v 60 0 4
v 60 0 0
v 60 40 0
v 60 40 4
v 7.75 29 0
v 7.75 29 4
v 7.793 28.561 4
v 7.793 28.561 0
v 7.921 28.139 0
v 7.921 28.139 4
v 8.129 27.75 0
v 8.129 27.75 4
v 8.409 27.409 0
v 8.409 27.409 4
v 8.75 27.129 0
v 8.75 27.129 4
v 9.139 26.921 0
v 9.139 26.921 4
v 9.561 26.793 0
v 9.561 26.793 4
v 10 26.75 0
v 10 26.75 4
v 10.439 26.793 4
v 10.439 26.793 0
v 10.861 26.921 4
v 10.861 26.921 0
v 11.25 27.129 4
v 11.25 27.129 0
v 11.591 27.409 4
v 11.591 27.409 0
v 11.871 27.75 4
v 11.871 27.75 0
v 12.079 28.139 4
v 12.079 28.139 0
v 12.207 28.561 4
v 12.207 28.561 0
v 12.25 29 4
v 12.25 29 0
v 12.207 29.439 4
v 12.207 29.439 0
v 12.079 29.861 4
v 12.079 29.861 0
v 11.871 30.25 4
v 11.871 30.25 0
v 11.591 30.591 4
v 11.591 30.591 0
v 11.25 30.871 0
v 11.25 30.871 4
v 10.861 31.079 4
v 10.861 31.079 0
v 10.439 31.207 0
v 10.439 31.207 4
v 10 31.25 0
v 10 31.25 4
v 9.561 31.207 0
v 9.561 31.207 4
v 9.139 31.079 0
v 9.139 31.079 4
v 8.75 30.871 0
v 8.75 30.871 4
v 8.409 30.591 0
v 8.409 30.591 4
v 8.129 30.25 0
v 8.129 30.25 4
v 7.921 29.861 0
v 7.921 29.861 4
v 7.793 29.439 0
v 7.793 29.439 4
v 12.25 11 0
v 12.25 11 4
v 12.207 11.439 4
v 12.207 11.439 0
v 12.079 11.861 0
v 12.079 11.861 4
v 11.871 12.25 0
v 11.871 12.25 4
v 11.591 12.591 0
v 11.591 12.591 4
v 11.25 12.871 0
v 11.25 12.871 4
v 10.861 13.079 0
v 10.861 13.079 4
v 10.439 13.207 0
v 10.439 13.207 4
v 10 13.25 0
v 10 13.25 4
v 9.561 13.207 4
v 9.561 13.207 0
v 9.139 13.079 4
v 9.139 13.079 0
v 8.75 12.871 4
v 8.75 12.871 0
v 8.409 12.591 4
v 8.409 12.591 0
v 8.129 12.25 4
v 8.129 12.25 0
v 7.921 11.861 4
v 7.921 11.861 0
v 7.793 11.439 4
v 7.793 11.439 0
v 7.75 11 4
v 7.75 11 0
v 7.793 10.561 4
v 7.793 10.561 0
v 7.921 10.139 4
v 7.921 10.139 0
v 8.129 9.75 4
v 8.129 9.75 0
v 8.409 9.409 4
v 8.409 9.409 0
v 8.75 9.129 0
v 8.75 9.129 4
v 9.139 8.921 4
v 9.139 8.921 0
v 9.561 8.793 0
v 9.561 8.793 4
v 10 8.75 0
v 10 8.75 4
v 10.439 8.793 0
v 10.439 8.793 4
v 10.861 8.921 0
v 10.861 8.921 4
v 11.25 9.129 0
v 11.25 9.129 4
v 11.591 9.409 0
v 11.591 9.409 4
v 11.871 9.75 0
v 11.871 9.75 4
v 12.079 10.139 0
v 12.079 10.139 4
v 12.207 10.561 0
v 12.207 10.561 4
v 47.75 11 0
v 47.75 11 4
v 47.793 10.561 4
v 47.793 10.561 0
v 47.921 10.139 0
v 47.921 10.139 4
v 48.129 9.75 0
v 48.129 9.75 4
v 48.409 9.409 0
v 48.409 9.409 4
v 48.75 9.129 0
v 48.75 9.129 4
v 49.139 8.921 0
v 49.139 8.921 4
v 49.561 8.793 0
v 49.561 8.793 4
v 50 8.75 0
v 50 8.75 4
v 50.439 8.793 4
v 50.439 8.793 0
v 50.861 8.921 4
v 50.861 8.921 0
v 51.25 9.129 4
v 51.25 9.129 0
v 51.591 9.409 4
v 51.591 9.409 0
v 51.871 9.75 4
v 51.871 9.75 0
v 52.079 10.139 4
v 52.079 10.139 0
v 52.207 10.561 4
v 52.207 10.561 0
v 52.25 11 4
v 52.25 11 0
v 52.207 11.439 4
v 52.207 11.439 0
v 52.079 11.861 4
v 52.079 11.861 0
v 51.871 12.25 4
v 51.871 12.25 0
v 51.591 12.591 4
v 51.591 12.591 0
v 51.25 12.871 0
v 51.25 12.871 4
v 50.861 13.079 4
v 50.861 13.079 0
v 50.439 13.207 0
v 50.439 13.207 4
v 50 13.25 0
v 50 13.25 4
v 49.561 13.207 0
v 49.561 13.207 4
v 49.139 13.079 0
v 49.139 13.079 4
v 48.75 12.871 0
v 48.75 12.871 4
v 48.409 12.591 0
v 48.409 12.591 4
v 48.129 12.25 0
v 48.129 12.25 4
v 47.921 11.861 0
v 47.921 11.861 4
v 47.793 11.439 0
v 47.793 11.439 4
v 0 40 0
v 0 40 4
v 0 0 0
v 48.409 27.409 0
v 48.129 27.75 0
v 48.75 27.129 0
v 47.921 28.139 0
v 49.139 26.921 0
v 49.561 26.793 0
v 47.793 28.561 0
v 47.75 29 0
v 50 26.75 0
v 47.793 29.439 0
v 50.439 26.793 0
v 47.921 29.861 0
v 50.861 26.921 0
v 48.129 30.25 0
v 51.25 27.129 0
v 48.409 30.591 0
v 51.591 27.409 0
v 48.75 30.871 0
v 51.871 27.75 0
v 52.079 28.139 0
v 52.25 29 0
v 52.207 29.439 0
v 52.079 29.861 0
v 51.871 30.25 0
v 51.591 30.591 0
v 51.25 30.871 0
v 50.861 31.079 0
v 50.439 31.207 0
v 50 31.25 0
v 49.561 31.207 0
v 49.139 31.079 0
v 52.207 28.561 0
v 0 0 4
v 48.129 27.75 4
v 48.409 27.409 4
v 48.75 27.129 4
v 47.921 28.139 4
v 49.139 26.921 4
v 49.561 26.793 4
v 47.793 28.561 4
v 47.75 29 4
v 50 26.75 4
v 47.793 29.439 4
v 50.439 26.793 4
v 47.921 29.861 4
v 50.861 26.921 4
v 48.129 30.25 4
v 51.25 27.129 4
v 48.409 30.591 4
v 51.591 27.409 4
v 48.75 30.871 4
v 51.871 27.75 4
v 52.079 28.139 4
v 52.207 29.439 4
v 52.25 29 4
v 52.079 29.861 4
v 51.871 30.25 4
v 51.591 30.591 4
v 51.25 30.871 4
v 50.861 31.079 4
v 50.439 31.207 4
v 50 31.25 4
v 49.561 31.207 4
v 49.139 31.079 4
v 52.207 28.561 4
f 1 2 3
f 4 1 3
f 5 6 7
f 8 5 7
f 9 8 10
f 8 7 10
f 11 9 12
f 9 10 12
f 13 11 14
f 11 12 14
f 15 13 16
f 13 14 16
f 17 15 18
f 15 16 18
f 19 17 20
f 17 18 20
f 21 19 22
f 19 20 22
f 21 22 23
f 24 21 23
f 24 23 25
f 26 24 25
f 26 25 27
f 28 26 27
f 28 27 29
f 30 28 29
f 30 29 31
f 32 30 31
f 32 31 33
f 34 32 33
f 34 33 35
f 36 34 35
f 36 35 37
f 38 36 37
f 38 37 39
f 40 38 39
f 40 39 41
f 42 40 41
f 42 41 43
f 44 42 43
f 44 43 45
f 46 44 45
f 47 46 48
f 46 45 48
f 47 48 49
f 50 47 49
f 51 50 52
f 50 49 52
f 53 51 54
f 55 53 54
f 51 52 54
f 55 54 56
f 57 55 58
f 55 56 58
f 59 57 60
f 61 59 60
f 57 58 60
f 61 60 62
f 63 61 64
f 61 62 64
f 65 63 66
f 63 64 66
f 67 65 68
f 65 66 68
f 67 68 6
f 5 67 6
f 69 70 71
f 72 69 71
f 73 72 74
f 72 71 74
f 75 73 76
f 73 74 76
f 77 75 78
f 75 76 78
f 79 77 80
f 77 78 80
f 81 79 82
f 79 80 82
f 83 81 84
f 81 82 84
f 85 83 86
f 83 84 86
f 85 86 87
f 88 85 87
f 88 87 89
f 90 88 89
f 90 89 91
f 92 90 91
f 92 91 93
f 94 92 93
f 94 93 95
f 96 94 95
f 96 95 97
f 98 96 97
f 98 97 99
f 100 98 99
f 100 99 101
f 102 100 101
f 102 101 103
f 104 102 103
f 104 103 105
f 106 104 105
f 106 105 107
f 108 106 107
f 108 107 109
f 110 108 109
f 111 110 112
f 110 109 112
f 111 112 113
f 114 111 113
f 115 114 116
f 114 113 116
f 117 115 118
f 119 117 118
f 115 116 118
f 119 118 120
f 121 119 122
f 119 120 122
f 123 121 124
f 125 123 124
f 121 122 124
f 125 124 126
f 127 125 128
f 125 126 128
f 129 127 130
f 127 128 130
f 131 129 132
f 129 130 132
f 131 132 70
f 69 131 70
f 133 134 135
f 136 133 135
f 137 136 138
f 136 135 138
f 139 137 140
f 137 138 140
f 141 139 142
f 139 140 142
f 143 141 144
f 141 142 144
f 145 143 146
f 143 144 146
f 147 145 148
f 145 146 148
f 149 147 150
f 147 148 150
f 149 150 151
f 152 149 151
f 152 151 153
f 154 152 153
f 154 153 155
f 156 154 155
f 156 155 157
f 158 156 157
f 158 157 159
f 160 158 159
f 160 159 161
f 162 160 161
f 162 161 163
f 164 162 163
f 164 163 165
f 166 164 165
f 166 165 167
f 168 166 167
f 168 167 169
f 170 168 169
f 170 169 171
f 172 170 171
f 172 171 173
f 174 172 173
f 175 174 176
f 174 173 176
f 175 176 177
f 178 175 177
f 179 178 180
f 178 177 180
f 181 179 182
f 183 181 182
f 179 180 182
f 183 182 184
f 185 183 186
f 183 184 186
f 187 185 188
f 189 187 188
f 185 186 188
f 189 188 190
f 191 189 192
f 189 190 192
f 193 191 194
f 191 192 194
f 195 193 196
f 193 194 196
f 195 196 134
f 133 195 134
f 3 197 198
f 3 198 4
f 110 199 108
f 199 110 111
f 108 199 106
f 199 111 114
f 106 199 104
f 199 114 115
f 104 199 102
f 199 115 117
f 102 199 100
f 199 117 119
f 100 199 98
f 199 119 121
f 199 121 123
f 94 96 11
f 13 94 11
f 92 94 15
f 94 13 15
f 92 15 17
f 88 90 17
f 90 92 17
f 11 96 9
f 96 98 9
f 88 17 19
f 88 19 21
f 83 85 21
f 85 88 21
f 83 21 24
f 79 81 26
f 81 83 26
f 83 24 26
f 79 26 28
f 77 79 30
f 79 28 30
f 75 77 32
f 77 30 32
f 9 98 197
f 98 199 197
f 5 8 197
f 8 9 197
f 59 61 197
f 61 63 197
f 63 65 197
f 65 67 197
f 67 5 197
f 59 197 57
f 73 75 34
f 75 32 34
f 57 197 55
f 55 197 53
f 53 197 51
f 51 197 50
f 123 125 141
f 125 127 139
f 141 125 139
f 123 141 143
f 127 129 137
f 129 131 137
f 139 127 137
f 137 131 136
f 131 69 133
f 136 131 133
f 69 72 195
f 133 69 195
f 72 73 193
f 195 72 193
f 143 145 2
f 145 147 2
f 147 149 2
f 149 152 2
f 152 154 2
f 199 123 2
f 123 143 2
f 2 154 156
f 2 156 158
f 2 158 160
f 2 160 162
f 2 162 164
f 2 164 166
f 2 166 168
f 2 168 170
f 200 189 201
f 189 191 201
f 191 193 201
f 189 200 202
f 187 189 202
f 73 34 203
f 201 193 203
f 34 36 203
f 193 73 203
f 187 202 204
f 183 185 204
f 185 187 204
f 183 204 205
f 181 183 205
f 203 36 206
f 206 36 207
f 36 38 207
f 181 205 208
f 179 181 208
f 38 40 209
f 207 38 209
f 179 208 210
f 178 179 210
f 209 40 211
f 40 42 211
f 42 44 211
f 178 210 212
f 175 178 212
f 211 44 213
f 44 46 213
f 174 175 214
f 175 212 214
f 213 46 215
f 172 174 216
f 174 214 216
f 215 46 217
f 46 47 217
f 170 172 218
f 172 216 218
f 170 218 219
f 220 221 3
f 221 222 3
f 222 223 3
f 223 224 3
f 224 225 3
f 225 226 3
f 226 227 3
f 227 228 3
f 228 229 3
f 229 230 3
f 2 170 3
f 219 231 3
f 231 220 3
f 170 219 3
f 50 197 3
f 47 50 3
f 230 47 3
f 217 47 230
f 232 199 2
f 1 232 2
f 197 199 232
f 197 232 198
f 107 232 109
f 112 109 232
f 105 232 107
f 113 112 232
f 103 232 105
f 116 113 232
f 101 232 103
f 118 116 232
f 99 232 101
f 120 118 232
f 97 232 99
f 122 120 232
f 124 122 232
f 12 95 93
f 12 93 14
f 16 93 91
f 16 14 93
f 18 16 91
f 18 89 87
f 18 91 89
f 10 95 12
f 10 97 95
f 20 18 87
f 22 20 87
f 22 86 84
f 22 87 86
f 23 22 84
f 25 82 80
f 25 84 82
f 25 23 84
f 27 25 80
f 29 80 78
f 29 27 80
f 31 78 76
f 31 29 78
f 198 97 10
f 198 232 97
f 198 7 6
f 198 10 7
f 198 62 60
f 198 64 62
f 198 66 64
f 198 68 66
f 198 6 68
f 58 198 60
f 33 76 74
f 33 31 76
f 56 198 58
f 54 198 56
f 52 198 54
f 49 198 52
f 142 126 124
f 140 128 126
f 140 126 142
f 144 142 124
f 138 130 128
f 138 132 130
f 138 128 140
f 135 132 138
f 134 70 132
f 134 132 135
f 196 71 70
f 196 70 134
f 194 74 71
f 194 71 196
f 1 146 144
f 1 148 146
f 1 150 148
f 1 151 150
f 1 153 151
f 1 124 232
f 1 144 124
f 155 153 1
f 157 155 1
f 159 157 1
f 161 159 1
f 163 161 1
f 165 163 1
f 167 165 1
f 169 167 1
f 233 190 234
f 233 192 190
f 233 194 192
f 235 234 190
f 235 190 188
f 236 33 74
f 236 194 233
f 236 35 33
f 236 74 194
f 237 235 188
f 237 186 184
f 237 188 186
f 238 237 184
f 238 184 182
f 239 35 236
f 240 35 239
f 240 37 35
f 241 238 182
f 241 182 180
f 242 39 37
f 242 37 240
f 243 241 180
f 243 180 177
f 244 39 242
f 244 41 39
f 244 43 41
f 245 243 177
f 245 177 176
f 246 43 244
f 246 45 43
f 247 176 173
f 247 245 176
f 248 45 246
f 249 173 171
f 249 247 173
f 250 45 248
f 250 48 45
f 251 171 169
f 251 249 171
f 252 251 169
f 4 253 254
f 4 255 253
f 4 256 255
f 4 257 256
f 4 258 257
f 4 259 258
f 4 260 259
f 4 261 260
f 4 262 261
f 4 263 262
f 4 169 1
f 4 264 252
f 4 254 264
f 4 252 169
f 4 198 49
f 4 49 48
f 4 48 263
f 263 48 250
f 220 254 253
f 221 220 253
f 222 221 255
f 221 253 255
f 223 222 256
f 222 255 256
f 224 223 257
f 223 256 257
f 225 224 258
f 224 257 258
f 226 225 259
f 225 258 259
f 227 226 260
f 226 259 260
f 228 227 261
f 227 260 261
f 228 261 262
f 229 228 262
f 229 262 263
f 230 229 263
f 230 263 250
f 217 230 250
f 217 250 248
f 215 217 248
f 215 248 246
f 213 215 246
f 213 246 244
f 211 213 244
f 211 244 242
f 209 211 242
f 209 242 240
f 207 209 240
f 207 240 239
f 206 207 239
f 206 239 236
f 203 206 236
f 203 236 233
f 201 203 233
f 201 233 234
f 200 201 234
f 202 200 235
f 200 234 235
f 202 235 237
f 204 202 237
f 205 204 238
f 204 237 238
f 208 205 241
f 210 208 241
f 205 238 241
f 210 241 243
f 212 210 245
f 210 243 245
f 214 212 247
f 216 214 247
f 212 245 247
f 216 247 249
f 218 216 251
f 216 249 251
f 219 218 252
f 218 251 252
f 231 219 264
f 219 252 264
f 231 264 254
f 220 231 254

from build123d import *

# Parameters (mm, degrees)
SKETCH_1_W          = 60
SKETCH_1_H          = 40
EXTRUDE_1_DEPTH     = 4
SKETCH_2_R          = 2.25
CUT_EXTRUDE_1_DEPTH = 73.221880341


with BuildPart() as part:
    # 草图1 → 凸台-拉伸1 (new body)
    with BuildSketch(Plane.XY):
        with Locations((30, 20)):
            Rectangle(SKETCH_1_W, SKETCH_1_H)
    extrude(amount=EXTRUDE_1_DEPTH)

    # 草图2 → 切除-拉伸1 (cut, through all)
    with BuildSketch(Plane.XY.offset(4)):
        with Locations((10, 11)):
            Circle(SKETCH_2_R)
        with Locations(Location((50, 11, 0), (0, 0, 180))):
            Circle(SKETCH_2_R)
        with Locations((50, 29)):
            Circle(SKETCH_2_R)
        with Locations(Location((10, 29, 0), (0, 0, 180))):
            Circle(SKETCH_2_R)
    extrude(amount=-CUT_EXTRUDE_1_DEPTH, mode=Mode.SUBTRACT)


solid = part.part
